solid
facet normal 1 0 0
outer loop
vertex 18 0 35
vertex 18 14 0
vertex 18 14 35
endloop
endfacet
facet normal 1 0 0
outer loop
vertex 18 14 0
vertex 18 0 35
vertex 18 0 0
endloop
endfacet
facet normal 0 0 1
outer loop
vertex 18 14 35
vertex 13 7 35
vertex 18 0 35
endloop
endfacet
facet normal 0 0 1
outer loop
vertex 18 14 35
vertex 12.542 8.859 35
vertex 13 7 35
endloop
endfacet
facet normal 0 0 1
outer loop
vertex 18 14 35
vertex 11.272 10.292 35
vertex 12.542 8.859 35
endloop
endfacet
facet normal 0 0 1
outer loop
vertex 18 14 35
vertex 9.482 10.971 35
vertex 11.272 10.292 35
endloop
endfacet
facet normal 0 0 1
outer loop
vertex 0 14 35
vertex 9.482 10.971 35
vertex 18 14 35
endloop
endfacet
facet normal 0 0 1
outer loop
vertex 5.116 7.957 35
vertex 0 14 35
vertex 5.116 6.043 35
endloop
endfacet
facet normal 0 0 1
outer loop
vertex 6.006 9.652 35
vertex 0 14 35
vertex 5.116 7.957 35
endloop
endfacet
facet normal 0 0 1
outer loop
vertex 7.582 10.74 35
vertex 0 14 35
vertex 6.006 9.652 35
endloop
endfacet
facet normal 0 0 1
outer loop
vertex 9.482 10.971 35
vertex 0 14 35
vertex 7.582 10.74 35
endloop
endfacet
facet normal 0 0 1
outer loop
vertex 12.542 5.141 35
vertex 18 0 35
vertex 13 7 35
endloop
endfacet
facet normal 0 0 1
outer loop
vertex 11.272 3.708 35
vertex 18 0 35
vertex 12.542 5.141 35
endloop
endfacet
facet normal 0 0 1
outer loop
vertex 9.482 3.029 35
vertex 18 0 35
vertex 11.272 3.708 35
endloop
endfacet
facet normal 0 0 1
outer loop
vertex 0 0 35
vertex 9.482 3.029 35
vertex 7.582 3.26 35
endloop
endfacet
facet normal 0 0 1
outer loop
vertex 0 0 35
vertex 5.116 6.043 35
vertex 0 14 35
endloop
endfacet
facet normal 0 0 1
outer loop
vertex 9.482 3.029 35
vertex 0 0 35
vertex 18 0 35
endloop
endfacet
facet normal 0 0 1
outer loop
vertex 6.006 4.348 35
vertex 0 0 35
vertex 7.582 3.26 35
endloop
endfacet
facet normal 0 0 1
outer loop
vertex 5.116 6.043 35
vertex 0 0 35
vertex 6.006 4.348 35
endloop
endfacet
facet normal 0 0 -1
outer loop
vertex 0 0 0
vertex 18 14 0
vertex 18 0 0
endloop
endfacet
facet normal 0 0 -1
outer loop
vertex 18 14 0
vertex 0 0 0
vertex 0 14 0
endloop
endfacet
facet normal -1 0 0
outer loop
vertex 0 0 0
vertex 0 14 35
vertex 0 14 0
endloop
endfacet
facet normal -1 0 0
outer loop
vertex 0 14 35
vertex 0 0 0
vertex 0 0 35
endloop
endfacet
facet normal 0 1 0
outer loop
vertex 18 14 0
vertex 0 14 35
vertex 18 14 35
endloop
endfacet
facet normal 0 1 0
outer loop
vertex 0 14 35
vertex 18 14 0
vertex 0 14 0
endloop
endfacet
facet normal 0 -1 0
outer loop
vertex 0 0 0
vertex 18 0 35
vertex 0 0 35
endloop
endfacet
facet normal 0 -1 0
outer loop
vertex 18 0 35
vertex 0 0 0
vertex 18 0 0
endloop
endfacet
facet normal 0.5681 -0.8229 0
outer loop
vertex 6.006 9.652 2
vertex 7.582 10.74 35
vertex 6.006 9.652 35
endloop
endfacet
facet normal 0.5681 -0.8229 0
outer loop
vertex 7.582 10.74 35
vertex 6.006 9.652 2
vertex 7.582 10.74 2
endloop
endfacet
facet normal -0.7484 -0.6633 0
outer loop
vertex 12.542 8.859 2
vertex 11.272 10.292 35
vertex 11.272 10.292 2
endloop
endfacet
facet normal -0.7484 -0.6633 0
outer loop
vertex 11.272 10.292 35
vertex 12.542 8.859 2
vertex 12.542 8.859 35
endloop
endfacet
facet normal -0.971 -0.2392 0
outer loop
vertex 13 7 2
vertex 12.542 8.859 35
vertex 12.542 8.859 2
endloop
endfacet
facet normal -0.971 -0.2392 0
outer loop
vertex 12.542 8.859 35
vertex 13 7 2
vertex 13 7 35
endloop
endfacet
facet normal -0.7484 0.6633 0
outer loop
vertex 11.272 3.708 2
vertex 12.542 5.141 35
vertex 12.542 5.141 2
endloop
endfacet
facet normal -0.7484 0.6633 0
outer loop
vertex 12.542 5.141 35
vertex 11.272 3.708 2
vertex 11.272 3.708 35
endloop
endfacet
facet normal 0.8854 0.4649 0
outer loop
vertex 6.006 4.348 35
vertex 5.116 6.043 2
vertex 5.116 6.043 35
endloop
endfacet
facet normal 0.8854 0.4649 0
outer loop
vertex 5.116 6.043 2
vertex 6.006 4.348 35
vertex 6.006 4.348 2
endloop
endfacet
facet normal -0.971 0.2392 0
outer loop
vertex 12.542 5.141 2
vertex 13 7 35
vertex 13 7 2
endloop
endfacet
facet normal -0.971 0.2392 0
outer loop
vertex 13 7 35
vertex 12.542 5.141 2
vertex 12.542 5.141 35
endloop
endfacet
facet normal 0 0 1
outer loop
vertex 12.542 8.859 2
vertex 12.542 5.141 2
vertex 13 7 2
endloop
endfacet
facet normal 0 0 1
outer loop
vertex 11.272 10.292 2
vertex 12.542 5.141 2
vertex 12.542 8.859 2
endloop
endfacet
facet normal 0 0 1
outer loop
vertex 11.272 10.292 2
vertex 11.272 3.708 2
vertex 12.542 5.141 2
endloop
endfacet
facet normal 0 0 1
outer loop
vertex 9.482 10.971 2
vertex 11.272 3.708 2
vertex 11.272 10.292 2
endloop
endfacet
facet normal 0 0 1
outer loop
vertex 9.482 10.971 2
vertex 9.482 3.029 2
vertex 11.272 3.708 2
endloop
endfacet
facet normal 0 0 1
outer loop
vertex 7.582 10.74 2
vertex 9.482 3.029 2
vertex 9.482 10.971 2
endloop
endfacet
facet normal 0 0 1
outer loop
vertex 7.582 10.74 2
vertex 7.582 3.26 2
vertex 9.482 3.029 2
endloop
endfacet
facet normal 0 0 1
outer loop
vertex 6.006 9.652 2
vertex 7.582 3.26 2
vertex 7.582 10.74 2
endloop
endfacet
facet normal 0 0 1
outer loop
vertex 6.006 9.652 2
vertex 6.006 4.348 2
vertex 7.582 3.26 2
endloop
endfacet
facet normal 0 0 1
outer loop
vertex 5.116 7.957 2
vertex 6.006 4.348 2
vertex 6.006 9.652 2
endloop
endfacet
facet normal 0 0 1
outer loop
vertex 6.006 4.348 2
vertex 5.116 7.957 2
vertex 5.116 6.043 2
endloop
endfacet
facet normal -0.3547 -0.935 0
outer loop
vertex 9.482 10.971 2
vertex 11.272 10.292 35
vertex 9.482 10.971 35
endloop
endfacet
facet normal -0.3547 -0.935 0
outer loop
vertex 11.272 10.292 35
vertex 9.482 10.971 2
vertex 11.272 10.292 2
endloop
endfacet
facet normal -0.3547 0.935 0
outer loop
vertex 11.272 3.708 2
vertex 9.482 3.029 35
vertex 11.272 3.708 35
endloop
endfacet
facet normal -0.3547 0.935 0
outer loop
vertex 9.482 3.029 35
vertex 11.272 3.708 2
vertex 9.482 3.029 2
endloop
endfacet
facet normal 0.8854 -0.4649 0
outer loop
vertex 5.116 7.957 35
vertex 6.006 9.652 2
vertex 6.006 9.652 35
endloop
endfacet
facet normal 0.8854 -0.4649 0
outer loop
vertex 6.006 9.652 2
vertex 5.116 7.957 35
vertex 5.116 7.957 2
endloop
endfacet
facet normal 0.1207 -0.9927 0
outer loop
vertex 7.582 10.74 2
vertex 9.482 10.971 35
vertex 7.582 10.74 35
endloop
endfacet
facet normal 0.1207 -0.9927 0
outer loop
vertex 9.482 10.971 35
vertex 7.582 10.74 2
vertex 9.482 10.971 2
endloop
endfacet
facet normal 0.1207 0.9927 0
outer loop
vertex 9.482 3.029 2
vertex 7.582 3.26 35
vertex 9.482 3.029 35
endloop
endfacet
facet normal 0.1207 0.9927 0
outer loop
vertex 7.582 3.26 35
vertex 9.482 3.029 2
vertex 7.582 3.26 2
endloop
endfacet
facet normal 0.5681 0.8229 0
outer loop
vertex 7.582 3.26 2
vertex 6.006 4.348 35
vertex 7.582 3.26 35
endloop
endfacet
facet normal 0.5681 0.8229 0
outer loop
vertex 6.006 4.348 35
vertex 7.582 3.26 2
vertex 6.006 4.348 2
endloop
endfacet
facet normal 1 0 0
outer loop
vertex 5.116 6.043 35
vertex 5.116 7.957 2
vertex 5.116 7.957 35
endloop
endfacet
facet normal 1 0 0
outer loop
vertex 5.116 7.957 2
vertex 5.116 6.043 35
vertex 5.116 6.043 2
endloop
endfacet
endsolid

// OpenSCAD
difference()
{
	cube([18,14,35]);
	translate([9,7,2]) cylinder(h=35,d=8);
}
